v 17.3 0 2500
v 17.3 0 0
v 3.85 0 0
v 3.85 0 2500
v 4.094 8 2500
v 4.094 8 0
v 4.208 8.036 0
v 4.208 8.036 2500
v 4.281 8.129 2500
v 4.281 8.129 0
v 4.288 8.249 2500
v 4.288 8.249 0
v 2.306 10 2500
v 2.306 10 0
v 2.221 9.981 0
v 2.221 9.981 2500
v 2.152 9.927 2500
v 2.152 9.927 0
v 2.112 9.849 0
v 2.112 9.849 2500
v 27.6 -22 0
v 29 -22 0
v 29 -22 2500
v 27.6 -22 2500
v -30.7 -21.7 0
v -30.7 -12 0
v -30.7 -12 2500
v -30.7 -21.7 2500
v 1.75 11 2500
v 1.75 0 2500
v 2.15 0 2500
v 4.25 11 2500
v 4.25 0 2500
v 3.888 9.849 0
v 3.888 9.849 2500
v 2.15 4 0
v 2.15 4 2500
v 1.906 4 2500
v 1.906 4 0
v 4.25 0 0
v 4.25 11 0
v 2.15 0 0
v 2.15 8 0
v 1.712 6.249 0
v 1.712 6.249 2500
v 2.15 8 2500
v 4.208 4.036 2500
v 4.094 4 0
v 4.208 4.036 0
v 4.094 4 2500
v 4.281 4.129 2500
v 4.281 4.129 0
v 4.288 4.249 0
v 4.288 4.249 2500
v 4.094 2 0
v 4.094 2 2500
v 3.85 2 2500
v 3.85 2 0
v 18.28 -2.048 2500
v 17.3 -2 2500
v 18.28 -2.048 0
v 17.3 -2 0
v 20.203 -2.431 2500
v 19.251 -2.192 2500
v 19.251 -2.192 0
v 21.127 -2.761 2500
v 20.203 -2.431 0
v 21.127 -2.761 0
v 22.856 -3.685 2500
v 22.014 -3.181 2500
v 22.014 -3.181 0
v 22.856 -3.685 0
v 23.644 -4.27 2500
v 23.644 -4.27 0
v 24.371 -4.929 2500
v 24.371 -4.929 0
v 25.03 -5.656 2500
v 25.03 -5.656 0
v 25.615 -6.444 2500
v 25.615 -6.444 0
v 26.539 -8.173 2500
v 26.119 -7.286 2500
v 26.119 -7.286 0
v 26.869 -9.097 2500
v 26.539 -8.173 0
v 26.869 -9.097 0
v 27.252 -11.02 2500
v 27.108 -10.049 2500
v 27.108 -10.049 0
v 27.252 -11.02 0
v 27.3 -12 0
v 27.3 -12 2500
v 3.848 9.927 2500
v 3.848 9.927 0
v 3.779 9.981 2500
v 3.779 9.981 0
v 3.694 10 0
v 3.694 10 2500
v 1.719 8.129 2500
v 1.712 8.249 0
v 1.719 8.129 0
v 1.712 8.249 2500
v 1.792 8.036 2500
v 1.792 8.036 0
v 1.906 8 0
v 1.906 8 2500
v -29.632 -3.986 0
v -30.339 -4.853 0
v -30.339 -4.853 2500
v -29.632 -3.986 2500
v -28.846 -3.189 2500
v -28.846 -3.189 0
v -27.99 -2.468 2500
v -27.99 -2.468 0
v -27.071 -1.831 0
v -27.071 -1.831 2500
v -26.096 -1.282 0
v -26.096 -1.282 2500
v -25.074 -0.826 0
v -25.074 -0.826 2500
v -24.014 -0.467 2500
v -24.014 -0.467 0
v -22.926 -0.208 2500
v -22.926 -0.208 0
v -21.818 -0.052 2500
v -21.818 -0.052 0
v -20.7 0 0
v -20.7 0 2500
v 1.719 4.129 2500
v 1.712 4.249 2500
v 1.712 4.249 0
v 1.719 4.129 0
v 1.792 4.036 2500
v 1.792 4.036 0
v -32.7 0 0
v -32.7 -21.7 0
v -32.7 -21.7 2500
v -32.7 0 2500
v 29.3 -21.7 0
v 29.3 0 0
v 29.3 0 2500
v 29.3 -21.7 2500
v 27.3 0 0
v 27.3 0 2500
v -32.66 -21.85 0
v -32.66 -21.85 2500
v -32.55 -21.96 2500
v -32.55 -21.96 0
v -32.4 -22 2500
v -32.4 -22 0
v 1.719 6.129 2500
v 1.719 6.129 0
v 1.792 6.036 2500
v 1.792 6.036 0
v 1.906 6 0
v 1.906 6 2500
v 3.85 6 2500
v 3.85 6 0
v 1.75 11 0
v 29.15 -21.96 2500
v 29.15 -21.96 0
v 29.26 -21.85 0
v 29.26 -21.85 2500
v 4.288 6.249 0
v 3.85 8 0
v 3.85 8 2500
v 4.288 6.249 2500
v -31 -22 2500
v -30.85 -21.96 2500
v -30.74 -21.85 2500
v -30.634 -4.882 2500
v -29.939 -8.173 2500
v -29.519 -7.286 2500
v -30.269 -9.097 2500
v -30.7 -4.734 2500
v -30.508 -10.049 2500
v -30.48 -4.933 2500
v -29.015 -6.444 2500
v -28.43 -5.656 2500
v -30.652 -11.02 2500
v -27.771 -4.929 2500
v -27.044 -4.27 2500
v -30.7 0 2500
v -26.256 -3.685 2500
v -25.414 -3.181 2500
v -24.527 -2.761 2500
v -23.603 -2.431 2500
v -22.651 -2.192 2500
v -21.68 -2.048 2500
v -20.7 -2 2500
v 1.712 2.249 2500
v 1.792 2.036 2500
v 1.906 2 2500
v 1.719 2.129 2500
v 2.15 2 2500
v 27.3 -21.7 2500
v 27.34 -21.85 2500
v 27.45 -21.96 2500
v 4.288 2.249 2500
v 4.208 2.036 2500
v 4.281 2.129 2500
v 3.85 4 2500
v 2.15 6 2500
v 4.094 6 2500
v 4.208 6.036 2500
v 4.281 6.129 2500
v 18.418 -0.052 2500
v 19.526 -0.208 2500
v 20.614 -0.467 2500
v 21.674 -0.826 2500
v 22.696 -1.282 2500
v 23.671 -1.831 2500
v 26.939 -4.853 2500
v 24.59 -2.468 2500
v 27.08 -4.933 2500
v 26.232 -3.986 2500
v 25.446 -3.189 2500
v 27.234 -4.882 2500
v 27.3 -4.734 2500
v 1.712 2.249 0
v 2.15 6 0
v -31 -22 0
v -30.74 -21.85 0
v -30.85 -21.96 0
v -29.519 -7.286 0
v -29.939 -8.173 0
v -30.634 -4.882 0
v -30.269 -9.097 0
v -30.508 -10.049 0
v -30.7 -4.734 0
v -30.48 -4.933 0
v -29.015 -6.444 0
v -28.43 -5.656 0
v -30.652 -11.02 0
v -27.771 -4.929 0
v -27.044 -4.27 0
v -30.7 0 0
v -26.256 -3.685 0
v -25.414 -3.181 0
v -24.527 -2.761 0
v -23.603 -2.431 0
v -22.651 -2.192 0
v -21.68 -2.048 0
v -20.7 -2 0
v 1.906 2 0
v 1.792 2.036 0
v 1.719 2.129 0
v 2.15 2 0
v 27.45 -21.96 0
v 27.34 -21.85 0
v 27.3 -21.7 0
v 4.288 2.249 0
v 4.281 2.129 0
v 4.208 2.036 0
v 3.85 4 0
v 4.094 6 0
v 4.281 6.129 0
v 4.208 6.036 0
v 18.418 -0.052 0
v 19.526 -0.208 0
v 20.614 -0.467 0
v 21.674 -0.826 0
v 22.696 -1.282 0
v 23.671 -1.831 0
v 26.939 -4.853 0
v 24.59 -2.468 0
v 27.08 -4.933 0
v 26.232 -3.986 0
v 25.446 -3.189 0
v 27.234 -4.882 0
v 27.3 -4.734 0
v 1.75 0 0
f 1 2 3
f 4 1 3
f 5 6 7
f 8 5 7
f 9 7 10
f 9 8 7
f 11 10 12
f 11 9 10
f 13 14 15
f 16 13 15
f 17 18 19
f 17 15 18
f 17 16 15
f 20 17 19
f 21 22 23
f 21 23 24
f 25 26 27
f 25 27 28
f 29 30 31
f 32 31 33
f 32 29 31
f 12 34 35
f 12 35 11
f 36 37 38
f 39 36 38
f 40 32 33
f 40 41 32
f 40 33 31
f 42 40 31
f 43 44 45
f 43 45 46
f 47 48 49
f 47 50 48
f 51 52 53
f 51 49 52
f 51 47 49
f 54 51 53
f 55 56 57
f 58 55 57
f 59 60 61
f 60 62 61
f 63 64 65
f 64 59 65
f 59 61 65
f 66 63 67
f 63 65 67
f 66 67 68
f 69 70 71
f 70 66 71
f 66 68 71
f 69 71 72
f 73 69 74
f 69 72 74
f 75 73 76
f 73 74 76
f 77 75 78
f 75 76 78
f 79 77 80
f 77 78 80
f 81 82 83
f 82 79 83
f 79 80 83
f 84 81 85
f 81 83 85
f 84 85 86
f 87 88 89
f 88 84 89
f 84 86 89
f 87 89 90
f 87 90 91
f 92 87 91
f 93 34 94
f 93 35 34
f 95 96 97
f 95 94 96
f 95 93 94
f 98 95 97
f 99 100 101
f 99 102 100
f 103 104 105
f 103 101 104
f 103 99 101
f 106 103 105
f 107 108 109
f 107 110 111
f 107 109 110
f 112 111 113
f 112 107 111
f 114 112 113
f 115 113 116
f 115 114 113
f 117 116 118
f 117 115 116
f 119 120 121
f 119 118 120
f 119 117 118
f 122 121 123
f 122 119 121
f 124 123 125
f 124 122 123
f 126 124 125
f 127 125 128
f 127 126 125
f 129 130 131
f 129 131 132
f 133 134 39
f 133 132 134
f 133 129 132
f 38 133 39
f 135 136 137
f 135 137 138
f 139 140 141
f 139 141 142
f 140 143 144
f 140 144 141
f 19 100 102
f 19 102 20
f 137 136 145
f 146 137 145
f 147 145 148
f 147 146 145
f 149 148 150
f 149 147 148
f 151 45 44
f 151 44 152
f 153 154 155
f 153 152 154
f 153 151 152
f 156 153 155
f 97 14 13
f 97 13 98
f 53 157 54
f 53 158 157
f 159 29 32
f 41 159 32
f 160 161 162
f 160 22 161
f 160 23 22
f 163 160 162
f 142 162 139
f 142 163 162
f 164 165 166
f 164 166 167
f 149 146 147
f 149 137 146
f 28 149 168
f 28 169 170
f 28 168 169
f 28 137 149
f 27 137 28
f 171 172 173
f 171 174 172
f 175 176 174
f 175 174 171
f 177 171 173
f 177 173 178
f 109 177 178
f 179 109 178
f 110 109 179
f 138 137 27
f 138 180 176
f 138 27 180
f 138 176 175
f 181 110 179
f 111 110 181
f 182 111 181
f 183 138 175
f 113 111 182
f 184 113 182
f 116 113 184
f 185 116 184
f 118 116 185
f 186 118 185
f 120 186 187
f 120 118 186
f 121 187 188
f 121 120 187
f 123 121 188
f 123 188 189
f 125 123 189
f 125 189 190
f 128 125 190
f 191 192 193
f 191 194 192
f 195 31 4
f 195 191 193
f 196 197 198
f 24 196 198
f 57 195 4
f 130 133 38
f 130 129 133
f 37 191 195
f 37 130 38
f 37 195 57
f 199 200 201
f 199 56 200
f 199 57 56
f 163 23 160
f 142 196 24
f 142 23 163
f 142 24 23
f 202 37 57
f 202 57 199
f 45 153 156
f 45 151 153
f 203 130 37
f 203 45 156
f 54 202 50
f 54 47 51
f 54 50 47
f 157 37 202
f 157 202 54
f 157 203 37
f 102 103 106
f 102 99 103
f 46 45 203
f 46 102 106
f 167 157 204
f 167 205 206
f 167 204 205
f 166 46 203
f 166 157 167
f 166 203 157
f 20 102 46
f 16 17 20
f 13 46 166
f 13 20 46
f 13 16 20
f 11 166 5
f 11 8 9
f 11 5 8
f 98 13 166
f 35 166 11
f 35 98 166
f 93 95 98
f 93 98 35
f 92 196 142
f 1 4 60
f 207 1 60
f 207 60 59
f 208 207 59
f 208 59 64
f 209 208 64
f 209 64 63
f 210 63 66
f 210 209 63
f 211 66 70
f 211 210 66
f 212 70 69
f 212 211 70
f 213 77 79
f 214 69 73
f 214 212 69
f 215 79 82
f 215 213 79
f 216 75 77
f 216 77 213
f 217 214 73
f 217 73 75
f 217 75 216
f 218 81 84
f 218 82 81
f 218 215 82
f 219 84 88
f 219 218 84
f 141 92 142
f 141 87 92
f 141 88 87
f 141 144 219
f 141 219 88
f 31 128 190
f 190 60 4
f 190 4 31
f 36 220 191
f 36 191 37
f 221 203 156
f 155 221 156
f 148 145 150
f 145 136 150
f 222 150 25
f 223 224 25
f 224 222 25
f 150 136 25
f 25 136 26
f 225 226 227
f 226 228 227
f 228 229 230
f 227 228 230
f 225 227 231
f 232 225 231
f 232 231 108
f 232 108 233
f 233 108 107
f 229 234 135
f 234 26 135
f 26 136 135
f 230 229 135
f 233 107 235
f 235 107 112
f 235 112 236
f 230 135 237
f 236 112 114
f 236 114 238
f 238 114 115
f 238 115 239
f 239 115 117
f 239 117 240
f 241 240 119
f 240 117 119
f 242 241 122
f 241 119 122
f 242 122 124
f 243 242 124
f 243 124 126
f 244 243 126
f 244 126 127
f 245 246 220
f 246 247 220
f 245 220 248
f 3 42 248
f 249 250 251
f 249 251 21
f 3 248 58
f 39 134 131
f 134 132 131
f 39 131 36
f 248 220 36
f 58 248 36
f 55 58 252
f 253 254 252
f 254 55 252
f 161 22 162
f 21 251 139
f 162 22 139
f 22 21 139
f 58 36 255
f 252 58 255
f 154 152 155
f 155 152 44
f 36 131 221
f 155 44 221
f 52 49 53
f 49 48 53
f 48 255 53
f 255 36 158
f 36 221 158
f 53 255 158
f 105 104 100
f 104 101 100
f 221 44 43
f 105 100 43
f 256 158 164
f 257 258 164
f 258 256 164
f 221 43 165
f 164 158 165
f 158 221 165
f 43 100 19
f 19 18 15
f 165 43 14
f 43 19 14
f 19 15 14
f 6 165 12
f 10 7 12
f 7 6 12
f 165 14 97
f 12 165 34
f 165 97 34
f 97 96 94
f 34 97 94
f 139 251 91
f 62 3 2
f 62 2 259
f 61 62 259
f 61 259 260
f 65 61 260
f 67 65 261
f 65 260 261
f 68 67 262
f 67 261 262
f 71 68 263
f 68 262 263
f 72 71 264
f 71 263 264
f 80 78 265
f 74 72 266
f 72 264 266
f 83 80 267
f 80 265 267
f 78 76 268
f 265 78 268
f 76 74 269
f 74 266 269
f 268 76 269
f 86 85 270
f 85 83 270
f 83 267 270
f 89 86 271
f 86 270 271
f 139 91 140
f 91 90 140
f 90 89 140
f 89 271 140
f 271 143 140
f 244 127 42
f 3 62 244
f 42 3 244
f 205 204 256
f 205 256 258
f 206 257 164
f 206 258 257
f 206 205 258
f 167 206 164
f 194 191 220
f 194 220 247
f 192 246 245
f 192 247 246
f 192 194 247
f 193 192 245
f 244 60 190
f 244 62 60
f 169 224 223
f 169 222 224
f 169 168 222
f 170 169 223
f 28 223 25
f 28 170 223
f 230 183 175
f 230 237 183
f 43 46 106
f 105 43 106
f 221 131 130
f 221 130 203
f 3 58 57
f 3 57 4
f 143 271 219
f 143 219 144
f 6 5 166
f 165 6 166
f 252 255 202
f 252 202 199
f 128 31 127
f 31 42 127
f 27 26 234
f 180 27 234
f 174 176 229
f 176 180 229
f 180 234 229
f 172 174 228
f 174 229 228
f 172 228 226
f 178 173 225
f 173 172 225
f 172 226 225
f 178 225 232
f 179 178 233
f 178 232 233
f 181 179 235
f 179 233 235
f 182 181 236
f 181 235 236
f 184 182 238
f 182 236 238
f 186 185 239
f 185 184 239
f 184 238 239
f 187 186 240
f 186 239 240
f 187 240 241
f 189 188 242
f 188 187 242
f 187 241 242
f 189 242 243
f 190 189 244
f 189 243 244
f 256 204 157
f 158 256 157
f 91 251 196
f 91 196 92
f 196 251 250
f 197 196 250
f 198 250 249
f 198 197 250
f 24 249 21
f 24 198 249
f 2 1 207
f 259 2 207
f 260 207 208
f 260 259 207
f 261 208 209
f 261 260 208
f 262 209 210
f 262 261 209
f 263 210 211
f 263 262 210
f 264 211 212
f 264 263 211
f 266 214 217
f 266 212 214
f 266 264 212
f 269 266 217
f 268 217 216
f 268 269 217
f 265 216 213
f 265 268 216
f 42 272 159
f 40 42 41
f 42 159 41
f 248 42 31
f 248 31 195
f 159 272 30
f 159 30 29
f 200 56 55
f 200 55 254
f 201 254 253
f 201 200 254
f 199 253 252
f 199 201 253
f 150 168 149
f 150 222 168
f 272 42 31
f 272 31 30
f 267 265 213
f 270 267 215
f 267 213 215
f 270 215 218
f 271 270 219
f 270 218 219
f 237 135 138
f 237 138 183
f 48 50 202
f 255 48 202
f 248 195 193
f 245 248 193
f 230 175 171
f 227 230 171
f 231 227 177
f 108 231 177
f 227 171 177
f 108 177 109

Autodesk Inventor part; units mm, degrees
ref_plane "YZ Plane" through (0, 0, 0) normal (1, 0, 0) x (0, 1, 0)
ref_plane "XZ Plane" through (0, 0, 0) normal (0, 1, 0) x (-1, 0, 0)
ref_plane "XY Plane" through (0, 0, 0) normal (0, 0, 1) x (1, 0, 0)
sketch "Sketch2" plane through (0, 0, 0) normal (0, 0, 1) x (1, 0, 0)
  line L0 (29.3, 0) -> (29.3, -22)
  line L1 (29.3, -22) -> (27.3, -22)
  line L2 (27.3, -22) -> (27.3, -12)
  arc A0 (27.3, -12) -> (17.3, -2) centre (17.3, -12) ccw
  line L3 (17.3, -2) -> (-20.7, -2)
  arc A1 (-20.7, -2) -> (-30.7, -12) centre (-20.7, -12) ccw
  line L4 (-30.7, -12) -> (-30.7, -22)
  line L5 (-30.7, -22) -> (-32.7, -22)
  line L6 (-32.7, -22) -> (-32.7, 0)
  line L7 (-32.7, 0) -> (-30.7, 0)
  line L8 (-30.7, 0) -> (-30.7, -5.3668)
  arc A2 (-20.7, 0) -> (-30.7, -5.3668) centre (-20.7, -12) ccw
  arc A3 (27.3, -5.3667) -> (17.3, 0) centre (17.3, -12) ccw
  line L9 (27.3, -5.3667) -> (27.3, 0)
  line L10 (27.3, 0) -> (29.3, 0)
  line L11 (2.15, 0) -> (2.15, 2)
  line L12 (2.15, 2) -> (1.65, 2)
  line L13 (1.65, 2) -> (2.15, 4)
  line L14 (2.15, 4) -> (1.65, 4)
  line L15 (1.65, 4) -> (2.15, 6)
  line L16 (2.15, 6) -> (1.65, 6)
  line L17 (1.65, 6) -> (2.15, 8)
  line L18 (2.15, 8) -> (1.65, 8)
  line L19 (1.65, 8) -> (2.15, 10)
  line L20 (2.15, 10) -> (3.85, 10)
  line L21 (3.85, 10) -> (4.35, 8)
  line L22 (4.35, 8) -> (3.85, 8)
  line L23 (3.85, 8) -> (4.35, 6)
  line L24 (4.35, 6) -> (3.85, 6)
  line L25 (3.85, 6) -> (4.35, 4)
  line L26 (4.35, 4) -> (3.85, 4)
  line L27 (3.85, 4) -> (4.35, 2)
  line L28 (4.35, 2) -> (3.85, 2)
  line L29 (3.85, 2) -> (3.85, 0)
  line L30 (17.3, 0) -> (3.85, 0)
  line L31 (2.15, 0) -> (-20.7, 0)
  point P0 (0, 0)
  point P1 (0, 0)
  dimension "d0" = 10
  dimension "d1" = 12
  dimension "d2" = 22
  dimension "d3" = 62
  dimension "d4" = 2
  dimension "d5" = 10
  dimension "d6" = 10
  dimension "d23" = 25.45
  dimension "d25" = 0.5
  dimension "d26" = 2
  dimension "d27" = 1.7
  dimension "d28" = 2
  dimension "d29" = 2.15
  dimension "d30" = 10
  dimension "d31" = 2
  dimension "d32" = 2
  dimension "d33" = 22
  dimension "d34" = 20
  dimension "d35" = 2
  dimension "d36" = 10
  dimension "d37" = 2
  dimension "d38" = 10
extrude "01_ex1" add sketch "Sketch2" along normal blind 2500
fillet "Fillet2" radius 0.2 12 edges at (4.35, 8, 1250) (3.85, 10, 1250) (2.15, 10, 1250) (1.65, 8, 1250) (4.35, 6, 1250) (1.65, 6, 1250) (4.35, 4, 1250) (1.65, 4, 1250) (1.65, 2, 1250) (4.35, 2, 1250) (27.3, -5.3667, 1250) (-30.7, -5.3668, 1250)
fillet "Fillet2" radius 0.3 4 edges at (-30.7, -22, 1250) (-32.7, -22, 1250) (29.3, -22, 1250) (27.3, -22, 1250)
sketch "Sketch4" plane through (0, 0, 0) normal (0, 0, 1) x (1, 0, 0)
  line L0 (1.75, 11) -> (4.25, 11)
  line L1 (4.25, 11) -> (4.25, 0)
  line L2 (4.25, 0) -> (1.75, 0)
  line L3 (1.75, 0) -> (1.75, 11)
  line L4 (2.15, 0) -> (-20.7, 0) projected
  line L5 (3.85, 10) -> (2.15, 10) projected
  point P0 (0, 0)
  point P1 (3, 11)
  point P2 (3, 10)
  dimension "d41" = 2.5
  dimension "d42" = 11
extrude "02_ex1" add sketch "Sketch4" along normal blind 2500 separate body
ref_plane "Work Plane1" through (3, 2, 2500) normal (1, 0, 0) x (0, 0, -1)
equation "\"d5\" = d0"
equation "\"d6\" = d0"
equation "\"d39\" = Length"
equation "\"d43\" = Length"
equation "\"Length\" = 2500"
properties part number "Hafele_alu_126_37_U-01" material "Aluminum 6061"
